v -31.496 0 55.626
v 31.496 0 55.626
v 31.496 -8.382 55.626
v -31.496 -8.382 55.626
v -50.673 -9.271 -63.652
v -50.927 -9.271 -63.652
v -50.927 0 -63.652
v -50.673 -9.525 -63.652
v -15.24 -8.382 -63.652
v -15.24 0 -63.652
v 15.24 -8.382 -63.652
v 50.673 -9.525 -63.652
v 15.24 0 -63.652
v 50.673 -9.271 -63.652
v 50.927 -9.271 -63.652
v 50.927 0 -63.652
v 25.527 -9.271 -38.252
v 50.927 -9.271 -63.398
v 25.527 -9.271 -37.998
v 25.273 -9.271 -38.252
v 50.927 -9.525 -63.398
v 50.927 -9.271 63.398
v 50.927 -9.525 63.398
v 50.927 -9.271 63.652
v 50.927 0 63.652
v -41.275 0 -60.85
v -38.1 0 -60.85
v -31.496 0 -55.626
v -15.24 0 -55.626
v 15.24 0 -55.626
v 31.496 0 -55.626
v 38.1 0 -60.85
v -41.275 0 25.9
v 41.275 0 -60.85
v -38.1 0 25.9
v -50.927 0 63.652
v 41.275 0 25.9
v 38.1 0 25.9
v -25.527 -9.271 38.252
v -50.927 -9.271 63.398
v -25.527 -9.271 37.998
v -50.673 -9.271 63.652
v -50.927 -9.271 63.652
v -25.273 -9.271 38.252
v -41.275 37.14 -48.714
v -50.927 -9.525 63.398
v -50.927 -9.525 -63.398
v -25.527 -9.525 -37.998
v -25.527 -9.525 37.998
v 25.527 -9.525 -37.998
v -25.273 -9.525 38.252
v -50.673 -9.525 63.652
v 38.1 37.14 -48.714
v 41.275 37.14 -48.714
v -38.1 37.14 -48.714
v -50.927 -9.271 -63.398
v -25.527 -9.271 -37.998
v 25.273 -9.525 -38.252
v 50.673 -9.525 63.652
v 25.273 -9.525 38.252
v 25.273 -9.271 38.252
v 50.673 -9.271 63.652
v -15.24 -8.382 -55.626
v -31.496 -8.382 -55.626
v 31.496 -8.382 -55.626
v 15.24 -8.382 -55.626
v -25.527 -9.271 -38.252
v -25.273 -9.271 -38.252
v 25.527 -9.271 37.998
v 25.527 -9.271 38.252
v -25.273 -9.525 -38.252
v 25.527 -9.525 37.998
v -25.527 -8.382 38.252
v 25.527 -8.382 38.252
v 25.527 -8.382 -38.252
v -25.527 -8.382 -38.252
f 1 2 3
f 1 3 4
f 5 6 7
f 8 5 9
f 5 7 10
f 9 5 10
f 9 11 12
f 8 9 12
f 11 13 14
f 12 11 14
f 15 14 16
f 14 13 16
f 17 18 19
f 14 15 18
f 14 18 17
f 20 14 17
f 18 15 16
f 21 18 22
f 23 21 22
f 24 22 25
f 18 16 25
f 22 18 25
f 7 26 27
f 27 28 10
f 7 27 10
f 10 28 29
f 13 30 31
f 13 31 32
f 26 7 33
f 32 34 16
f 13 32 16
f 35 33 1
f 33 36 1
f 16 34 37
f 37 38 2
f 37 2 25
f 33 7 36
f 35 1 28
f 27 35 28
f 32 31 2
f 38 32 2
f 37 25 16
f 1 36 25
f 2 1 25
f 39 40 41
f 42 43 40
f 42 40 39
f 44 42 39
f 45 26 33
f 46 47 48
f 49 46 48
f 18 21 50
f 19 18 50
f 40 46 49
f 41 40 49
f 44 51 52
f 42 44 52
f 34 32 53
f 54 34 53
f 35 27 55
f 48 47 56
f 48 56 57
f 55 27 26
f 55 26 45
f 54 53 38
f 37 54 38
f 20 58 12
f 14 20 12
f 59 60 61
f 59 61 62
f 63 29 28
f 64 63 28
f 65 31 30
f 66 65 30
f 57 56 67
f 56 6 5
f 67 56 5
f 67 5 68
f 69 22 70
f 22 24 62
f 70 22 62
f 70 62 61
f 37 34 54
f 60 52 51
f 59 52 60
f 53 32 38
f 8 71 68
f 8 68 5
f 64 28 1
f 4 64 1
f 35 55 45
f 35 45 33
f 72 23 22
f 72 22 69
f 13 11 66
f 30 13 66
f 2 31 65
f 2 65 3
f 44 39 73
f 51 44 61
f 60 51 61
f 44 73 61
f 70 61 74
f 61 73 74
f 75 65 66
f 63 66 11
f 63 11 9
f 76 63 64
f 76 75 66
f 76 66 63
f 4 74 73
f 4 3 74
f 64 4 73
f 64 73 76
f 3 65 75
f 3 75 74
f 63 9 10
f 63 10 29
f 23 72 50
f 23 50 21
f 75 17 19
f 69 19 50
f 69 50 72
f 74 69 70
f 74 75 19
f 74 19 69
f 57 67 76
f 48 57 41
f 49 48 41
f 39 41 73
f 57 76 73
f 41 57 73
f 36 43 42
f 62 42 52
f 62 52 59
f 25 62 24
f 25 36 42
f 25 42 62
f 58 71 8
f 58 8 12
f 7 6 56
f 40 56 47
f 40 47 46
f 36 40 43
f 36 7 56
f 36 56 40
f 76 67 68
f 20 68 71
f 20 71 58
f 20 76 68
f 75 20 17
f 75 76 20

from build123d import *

# Parameters (mm, degrees)
F2_W              = 101.854
F2_H              = 127.3048
F2_W_2            = 51.054
F2_H_2            = 76.5048
F3_DEPTH          = 9.525
F4_W              = 62.992
F4_H              = 111.252
F5_DEPTH          = 8.382
F8_DEPTH          = 3.175
F9_W              = 30.48
F9_H              = 8.0264
F10_DEPTH         = 8.382
F12_DEPTH         = 0.254
F12_COPIES2_COUNT = 2


# Not quite as in the source:
# - a pattern or mirror of a feature is missing from the dataset's text; its kind, count and spacing are read off the source's solid


with BuildPart() as f3:
    # F2 (on Front) → F3 (new body)
    with BuildSketch(Plane.XZ):
        Rectangle(F2_W, F2_H)
        Rectangle(F2_W_2, F2_H_2, mode=Mode.SUBTRACT)
    extrude(amount=F3_DEPTH)

    # F4 (on face) → F5 (cut)
    with BuildSketch(Plane(origin=(0, 0, 0), x_dir=(-1, 0, 0), z_dir=(0, 1, 0))):
        Rectangle(F4_W, F4_H)
    extrude(amount=-F5_DEPTH, mode=Mode.SUBTRACT)

    # F7 (on offset) → F8 (join)
    with BuildSketch(Plane.YZ.offset(38.1)):
        Polygon((37.1396206319, -48.7135574222), (0, 25.9003154933), (0, -60.8499720693), align=None)
    f8 = extrude(amount=F8_DEPTH)

    # F8_copies: F8 across plane
    add(f8.mirror(Plane(origin=(0, 0, 0), x_dir=(0, 0, -1), z_dir=(-1, 0, 0))))

    # F9 (on face) → F10 (cut, through all)
    with BuildSketch(Plane(origin=(0, 0, 0), x_dir=(-1, 0, 0), z_dir=(0, 1, 0))):
        with Locations((0, -59.6392)):
            Rectangle(F9_W, F9_H)
    extrude(amount=-F10_DEPTH, mode=Mode.SUBTRACT)

    # F11 (on face) → F12 (cut)
    with BuildSketch(Plane.XZ.offset(9.525)):
        Polygon((-50.927, 63.3984), (-25.527, 37.9984), (-25.527, 38.2524), (-25.273, 38.2524), (-50.673, 63.6524), (-50.927, 63.6524), align=None)
    f12 = extrude(amount=-F12_DEPTH, mode=Mode.SUBTRACT)

    # F12_copies: F12 across plane
    add(f12.mirror(Plane(origin=(0, 0, 0), x_dir=(0, 0, 1), z_dir=(1, 0, 0))), mode=Mode.SUBTRACT)

    # F12_copies1: F12 across plane
    add(f12.mirror(Plane(origin=(0, 0, 0), x_dir=(-1, 0, 0), z_dir=(0, 0, -1))), mode=Mode.SUBTRACT)

    # F12_copies2: F12 ×2 about axis
    f12_copies2_axis = Axis((0, 0, 0), (0, 1, 0))
    for i in range(1, F12_COPIES2_COUNT):
        add(f12.rotate(f12_copies2_axis, i * 360 / F12_COPIES2_COUNT), mode=Mode.SUBTRACT)


solid = f3.part
